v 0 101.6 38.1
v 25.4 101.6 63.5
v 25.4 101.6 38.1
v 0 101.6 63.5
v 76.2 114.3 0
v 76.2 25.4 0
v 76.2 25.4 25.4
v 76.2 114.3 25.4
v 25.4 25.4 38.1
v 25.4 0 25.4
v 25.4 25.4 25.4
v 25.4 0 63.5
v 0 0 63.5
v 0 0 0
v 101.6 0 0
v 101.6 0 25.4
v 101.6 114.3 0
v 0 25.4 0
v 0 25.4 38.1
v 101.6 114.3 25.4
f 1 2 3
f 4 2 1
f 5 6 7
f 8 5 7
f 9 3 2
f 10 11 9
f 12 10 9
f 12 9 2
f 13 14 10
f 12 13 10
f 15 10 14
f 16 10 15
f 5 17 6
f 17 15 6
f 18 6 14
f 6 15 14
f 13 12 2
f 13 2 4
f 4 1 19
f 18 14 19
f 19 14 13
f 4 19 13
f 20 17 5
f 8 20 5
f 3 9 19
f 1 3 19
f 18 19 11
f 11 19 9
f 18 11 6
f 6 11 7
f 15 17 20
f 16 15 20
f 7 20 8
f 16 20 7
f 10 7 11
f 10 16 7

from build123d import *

# Parameters (mm, degrees)
F4_DEPTH = 25.4
F5_W     = 25.4
F5_H     = 25.4
F6_DEPTH = 76.2
F7_W     = 25.4
F7_H     = 25.4
F8_DEPTH = 88.9


# Not quite as in the source:
# - a variable given as a bare number and used for a length is read in inches; the dataset says mm whatever the document's units were


with BuildPart() as f4:
    # F3 (on Front) → F4 (new body)
    with BuildSketch(Plane.XZ):
        Polygon((0, 25.4), (0, 0), (25.4, 0), (101.6, 0), (101.6, 25.4), (25.4, 25.4), (25.4, 63.5), (0, 63.5), align=None)
    extrude(amount=-F4_DEPTH)

    # F5 (on face) → F6 (join)
    with BuildSketch(Plane(origin=(0, 25.4, 0), x_dir=(-1, 0, 0), z_dir=(0, 1, 0))):
        with Locations((-12.7, 50.8)):
            Rectangle(F5_W, F5_H)
    extrude(amount=F6_DEPTH)

    # F7 (on face) → F8 (join)
    with BuildSketch(Plane(origin=(0, 25.4, 0), x_dir=(-1, 0, 0), z_dir=(0, 1, 0))):
        with Locations((-88.9, 12.7)):
            Rectangle(F7_W, F7_H)
    extrude(amount=F8_DEPTH)


solid = f4.part
